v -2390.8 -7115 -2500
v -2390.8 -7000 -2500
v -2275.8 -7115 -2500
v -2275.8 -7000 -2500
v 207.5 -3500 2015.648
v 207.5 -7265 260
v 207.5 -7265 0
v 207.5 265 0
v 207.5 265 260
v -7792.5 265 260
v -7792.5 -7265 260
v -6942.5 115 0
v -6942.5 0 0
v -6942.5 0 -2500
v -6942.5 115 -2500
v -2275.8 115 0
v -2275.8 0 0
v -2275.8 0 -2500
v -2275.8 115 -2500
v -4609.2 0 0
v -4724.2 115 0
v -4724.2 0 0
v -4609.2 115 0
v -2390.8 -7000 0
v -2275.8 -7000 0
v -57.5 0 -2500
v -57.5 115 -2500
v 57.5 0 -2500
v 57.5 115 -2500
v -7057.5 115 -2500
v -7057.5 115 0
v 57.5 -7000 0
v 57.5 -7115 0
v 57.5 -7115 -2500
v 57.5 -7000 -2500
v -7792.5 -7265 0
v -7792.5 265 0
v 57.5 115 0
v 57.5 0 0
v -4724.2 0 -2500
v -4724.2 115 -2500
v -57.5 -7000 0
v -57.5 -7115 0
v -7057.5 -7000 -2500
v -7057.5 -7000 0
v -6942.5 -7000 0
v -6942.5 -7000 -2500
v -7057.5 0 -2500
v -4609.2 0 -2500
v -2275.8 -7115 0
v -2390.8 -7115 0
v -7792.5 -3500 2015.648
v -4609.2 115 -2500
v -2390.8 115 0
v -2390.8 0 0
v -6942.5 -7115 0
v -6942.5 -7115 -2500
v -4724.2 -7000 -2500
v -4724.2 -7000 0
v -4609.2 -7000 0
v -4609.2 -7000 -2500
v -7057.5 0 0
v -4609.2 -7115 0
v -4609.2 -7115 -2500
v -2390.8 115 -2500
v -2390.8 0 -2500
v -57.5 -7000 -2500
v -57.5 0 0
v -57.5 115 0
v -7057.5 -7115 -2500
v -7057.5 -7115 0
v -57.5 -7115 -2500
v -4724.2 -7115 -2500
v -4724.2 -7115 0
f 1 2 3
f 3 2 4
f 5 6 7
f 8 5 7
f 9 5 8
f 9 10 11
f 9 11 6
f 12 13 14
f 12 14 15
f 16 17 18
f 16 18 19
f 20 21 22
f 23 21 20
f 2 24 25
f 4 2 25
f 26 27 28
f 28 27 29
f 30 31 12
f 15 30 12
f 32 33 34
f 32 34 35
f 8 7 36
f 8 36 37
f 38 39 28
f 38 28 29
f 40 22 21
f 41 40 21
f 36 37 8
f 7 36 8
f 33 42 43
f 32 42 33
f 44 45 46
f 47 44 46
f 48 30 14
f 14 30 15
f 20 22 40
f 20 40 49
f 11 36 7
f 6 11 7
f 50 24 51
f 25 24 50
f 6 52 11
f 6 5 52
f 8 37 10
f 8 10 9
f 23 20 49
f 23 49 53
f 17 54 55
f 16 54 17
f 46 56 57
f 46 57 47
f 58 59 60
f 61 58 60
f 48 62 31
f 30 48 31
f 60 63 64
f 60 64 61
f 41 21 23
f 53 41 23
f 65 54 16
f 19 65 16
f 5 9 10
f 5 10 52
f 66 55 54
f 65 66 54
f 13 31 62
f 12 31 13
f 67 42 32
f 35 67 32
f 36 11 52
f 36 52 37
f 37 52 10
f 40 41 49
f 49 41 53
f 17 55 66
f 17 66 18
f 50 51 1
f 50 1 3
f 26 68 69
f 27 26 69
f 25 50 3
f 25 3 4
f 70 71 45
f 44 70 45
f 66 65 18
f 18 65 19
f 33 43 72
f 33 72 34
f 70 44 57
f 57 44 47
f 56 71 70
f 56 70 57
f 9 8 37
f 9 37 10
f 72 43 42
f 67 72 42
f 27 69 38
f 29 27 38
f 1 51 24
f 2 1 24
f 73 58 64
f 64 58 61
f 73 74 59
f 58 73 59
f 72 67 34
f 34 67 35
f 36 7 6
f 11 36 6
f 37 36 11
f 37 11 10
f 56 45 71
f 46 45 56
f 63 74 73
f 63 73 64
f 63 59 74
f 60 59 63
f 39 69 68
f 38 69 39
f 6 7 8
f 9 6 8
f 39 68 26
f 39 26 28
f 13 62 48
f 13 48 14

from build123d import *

# Parameters (mm, degrees)
F0_W          = 115
F0_H          = 115
F2_DEPTH      = 2500
F1_W          = 8000
F1_H          = 7530
F4_DEPTH      = 260
F3_W          = 7530
F3_H          = 260
F5_DEPTH      = 207.5
F5_DEPTH_BACK = 7792.5


with BuildPart() as f2:
    # F0 (on Top) → F2 (new body)
    with BuildSketch(Plane.XY):
        with Locations((0, 57.5)):
            Rectangle(F0_W, F0_H)
        with Locations((-2333.3, 57.5)):
            Rectangle(F0_W, F0_H)
        with Locations((-4666.7, 57.5)):
            Rectangle(F0_W, F0_H)
        with Locations((-7000, 57.5)):
            Rectangle(F0_W, F0_H)
        with Locations((-4666.7, -7057.5)):
            Rectangle(F0_W, F0_H)
        with Locations((0, -7057.5)):
            Rectangle(F0_W, F0_H)
        with Locations((-2333.3, -7057.5)):
            Rectangle(F0_W, F0_H)
        with Locations((-7000, -7057.5)):
            Rectangle(F0_W, F0_H)
    extrude(amount=-F2_DEPTH)


with BuildPart() as f4:
    # F1 (on Top) → F4 (new body)
    with BuildSketch(Plane.XY):
        with Locations((-3792.5, -3500)):
            Rectangle(F1_W, F1_H)
    extrude(amount=F4_DEPTH)


with BuildPart() as f5:
    # F3 (on Right) → F5 (new body, two sides)
    with BuildSketch(Plane.YZ) as f5_sk:
        with Locations((-3500, 130)):
            Rectangle(F3_W, F3_H)
        Polygon((-3500, 2015.648333), (-7265, 260), (265, 260), align=None)
    extrude(amount=F5_DEPTH)
    extrude(f5_sk.sketch, amount=-F5_DEPTH_BACK)


solid = Compound([f2.part, f4.part, f5.part])
